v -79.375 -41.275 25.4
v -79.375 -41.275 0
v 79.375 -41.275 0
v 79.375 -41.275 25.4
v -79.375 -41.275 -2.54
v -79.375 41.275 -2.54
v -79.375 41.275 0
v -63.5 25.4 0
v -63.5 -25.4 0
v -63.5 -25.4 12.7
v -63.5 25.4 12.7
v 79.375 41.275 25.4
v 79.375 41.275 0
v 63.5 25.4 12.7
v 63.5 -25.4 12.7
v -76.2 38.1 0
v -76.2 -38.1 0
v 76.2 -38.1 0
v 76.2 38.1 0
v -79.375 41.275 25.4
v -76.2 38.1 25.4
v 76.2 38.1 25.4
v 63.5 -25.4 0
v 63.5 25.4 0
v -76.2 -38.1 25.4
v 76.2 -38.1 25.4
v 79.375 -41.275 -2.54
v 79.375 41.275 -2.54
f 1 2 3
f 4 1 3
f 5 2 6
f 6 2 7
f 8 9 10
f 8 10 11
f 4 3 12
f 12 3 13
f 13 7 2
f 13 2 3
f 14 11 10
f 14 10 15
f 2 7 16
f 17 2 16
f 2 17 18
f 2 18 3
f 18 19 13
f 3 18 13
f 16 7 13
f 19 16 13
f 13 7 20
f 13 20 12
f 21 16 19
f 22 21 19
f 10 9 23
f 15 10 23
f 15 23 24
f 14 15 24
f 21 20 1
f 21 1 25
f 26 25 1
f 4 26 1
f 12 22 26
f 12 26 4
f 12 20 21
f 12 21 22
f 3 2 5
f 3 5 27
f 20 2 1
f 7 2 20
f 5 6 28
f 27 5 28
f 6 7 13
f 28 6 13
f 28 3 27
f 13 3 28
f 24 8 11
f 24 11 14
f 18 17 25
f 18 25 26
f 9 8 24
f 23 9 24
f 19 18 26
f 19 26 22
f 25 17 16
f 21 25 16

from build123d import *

# Parameters (mm, degrees)
F0_W     = 158.75
F0_H     = 82.55
F0_W_2   = 152.4
F0_H_2   = 76.2
F1_DEPTH = 25.4
F0_W_3   = 127
F0_H_3   = 50.8
F2_DEPTH = 12.7
F3_W     = 158.75
F3_H     = 82.55
F4_DEPTH = 2.54


with BuildPart() as f1:
    # F0 (on Top) → F1 (new body)
    with BuildSketch(Plane.XY):
        Rectangle(F0_W, F0_H)
        Rectangle(F0_W_2, F0_H_2, mode=Mode.SUBTRACT)
    extrude(amount=F1_DEPTH)


with BuildPart() as f2:
    # F0 (on Top) → F2 (new body)
    with BuildSketch(Plane.XY):
        Rectangle(F0_W_3, F0_H_3)
    extrude(amount=F2_DEPTH)


with BuildPart() as f4:
    # F3 (on Top) → F4 (new body)
    with BuildSketch(Plane.XY):
        Rectangle(F3_W, F3_H)
    extrude(amount=-F4_DEPTH)


solid = Compound([f1.part, f2.part, f4.part])
